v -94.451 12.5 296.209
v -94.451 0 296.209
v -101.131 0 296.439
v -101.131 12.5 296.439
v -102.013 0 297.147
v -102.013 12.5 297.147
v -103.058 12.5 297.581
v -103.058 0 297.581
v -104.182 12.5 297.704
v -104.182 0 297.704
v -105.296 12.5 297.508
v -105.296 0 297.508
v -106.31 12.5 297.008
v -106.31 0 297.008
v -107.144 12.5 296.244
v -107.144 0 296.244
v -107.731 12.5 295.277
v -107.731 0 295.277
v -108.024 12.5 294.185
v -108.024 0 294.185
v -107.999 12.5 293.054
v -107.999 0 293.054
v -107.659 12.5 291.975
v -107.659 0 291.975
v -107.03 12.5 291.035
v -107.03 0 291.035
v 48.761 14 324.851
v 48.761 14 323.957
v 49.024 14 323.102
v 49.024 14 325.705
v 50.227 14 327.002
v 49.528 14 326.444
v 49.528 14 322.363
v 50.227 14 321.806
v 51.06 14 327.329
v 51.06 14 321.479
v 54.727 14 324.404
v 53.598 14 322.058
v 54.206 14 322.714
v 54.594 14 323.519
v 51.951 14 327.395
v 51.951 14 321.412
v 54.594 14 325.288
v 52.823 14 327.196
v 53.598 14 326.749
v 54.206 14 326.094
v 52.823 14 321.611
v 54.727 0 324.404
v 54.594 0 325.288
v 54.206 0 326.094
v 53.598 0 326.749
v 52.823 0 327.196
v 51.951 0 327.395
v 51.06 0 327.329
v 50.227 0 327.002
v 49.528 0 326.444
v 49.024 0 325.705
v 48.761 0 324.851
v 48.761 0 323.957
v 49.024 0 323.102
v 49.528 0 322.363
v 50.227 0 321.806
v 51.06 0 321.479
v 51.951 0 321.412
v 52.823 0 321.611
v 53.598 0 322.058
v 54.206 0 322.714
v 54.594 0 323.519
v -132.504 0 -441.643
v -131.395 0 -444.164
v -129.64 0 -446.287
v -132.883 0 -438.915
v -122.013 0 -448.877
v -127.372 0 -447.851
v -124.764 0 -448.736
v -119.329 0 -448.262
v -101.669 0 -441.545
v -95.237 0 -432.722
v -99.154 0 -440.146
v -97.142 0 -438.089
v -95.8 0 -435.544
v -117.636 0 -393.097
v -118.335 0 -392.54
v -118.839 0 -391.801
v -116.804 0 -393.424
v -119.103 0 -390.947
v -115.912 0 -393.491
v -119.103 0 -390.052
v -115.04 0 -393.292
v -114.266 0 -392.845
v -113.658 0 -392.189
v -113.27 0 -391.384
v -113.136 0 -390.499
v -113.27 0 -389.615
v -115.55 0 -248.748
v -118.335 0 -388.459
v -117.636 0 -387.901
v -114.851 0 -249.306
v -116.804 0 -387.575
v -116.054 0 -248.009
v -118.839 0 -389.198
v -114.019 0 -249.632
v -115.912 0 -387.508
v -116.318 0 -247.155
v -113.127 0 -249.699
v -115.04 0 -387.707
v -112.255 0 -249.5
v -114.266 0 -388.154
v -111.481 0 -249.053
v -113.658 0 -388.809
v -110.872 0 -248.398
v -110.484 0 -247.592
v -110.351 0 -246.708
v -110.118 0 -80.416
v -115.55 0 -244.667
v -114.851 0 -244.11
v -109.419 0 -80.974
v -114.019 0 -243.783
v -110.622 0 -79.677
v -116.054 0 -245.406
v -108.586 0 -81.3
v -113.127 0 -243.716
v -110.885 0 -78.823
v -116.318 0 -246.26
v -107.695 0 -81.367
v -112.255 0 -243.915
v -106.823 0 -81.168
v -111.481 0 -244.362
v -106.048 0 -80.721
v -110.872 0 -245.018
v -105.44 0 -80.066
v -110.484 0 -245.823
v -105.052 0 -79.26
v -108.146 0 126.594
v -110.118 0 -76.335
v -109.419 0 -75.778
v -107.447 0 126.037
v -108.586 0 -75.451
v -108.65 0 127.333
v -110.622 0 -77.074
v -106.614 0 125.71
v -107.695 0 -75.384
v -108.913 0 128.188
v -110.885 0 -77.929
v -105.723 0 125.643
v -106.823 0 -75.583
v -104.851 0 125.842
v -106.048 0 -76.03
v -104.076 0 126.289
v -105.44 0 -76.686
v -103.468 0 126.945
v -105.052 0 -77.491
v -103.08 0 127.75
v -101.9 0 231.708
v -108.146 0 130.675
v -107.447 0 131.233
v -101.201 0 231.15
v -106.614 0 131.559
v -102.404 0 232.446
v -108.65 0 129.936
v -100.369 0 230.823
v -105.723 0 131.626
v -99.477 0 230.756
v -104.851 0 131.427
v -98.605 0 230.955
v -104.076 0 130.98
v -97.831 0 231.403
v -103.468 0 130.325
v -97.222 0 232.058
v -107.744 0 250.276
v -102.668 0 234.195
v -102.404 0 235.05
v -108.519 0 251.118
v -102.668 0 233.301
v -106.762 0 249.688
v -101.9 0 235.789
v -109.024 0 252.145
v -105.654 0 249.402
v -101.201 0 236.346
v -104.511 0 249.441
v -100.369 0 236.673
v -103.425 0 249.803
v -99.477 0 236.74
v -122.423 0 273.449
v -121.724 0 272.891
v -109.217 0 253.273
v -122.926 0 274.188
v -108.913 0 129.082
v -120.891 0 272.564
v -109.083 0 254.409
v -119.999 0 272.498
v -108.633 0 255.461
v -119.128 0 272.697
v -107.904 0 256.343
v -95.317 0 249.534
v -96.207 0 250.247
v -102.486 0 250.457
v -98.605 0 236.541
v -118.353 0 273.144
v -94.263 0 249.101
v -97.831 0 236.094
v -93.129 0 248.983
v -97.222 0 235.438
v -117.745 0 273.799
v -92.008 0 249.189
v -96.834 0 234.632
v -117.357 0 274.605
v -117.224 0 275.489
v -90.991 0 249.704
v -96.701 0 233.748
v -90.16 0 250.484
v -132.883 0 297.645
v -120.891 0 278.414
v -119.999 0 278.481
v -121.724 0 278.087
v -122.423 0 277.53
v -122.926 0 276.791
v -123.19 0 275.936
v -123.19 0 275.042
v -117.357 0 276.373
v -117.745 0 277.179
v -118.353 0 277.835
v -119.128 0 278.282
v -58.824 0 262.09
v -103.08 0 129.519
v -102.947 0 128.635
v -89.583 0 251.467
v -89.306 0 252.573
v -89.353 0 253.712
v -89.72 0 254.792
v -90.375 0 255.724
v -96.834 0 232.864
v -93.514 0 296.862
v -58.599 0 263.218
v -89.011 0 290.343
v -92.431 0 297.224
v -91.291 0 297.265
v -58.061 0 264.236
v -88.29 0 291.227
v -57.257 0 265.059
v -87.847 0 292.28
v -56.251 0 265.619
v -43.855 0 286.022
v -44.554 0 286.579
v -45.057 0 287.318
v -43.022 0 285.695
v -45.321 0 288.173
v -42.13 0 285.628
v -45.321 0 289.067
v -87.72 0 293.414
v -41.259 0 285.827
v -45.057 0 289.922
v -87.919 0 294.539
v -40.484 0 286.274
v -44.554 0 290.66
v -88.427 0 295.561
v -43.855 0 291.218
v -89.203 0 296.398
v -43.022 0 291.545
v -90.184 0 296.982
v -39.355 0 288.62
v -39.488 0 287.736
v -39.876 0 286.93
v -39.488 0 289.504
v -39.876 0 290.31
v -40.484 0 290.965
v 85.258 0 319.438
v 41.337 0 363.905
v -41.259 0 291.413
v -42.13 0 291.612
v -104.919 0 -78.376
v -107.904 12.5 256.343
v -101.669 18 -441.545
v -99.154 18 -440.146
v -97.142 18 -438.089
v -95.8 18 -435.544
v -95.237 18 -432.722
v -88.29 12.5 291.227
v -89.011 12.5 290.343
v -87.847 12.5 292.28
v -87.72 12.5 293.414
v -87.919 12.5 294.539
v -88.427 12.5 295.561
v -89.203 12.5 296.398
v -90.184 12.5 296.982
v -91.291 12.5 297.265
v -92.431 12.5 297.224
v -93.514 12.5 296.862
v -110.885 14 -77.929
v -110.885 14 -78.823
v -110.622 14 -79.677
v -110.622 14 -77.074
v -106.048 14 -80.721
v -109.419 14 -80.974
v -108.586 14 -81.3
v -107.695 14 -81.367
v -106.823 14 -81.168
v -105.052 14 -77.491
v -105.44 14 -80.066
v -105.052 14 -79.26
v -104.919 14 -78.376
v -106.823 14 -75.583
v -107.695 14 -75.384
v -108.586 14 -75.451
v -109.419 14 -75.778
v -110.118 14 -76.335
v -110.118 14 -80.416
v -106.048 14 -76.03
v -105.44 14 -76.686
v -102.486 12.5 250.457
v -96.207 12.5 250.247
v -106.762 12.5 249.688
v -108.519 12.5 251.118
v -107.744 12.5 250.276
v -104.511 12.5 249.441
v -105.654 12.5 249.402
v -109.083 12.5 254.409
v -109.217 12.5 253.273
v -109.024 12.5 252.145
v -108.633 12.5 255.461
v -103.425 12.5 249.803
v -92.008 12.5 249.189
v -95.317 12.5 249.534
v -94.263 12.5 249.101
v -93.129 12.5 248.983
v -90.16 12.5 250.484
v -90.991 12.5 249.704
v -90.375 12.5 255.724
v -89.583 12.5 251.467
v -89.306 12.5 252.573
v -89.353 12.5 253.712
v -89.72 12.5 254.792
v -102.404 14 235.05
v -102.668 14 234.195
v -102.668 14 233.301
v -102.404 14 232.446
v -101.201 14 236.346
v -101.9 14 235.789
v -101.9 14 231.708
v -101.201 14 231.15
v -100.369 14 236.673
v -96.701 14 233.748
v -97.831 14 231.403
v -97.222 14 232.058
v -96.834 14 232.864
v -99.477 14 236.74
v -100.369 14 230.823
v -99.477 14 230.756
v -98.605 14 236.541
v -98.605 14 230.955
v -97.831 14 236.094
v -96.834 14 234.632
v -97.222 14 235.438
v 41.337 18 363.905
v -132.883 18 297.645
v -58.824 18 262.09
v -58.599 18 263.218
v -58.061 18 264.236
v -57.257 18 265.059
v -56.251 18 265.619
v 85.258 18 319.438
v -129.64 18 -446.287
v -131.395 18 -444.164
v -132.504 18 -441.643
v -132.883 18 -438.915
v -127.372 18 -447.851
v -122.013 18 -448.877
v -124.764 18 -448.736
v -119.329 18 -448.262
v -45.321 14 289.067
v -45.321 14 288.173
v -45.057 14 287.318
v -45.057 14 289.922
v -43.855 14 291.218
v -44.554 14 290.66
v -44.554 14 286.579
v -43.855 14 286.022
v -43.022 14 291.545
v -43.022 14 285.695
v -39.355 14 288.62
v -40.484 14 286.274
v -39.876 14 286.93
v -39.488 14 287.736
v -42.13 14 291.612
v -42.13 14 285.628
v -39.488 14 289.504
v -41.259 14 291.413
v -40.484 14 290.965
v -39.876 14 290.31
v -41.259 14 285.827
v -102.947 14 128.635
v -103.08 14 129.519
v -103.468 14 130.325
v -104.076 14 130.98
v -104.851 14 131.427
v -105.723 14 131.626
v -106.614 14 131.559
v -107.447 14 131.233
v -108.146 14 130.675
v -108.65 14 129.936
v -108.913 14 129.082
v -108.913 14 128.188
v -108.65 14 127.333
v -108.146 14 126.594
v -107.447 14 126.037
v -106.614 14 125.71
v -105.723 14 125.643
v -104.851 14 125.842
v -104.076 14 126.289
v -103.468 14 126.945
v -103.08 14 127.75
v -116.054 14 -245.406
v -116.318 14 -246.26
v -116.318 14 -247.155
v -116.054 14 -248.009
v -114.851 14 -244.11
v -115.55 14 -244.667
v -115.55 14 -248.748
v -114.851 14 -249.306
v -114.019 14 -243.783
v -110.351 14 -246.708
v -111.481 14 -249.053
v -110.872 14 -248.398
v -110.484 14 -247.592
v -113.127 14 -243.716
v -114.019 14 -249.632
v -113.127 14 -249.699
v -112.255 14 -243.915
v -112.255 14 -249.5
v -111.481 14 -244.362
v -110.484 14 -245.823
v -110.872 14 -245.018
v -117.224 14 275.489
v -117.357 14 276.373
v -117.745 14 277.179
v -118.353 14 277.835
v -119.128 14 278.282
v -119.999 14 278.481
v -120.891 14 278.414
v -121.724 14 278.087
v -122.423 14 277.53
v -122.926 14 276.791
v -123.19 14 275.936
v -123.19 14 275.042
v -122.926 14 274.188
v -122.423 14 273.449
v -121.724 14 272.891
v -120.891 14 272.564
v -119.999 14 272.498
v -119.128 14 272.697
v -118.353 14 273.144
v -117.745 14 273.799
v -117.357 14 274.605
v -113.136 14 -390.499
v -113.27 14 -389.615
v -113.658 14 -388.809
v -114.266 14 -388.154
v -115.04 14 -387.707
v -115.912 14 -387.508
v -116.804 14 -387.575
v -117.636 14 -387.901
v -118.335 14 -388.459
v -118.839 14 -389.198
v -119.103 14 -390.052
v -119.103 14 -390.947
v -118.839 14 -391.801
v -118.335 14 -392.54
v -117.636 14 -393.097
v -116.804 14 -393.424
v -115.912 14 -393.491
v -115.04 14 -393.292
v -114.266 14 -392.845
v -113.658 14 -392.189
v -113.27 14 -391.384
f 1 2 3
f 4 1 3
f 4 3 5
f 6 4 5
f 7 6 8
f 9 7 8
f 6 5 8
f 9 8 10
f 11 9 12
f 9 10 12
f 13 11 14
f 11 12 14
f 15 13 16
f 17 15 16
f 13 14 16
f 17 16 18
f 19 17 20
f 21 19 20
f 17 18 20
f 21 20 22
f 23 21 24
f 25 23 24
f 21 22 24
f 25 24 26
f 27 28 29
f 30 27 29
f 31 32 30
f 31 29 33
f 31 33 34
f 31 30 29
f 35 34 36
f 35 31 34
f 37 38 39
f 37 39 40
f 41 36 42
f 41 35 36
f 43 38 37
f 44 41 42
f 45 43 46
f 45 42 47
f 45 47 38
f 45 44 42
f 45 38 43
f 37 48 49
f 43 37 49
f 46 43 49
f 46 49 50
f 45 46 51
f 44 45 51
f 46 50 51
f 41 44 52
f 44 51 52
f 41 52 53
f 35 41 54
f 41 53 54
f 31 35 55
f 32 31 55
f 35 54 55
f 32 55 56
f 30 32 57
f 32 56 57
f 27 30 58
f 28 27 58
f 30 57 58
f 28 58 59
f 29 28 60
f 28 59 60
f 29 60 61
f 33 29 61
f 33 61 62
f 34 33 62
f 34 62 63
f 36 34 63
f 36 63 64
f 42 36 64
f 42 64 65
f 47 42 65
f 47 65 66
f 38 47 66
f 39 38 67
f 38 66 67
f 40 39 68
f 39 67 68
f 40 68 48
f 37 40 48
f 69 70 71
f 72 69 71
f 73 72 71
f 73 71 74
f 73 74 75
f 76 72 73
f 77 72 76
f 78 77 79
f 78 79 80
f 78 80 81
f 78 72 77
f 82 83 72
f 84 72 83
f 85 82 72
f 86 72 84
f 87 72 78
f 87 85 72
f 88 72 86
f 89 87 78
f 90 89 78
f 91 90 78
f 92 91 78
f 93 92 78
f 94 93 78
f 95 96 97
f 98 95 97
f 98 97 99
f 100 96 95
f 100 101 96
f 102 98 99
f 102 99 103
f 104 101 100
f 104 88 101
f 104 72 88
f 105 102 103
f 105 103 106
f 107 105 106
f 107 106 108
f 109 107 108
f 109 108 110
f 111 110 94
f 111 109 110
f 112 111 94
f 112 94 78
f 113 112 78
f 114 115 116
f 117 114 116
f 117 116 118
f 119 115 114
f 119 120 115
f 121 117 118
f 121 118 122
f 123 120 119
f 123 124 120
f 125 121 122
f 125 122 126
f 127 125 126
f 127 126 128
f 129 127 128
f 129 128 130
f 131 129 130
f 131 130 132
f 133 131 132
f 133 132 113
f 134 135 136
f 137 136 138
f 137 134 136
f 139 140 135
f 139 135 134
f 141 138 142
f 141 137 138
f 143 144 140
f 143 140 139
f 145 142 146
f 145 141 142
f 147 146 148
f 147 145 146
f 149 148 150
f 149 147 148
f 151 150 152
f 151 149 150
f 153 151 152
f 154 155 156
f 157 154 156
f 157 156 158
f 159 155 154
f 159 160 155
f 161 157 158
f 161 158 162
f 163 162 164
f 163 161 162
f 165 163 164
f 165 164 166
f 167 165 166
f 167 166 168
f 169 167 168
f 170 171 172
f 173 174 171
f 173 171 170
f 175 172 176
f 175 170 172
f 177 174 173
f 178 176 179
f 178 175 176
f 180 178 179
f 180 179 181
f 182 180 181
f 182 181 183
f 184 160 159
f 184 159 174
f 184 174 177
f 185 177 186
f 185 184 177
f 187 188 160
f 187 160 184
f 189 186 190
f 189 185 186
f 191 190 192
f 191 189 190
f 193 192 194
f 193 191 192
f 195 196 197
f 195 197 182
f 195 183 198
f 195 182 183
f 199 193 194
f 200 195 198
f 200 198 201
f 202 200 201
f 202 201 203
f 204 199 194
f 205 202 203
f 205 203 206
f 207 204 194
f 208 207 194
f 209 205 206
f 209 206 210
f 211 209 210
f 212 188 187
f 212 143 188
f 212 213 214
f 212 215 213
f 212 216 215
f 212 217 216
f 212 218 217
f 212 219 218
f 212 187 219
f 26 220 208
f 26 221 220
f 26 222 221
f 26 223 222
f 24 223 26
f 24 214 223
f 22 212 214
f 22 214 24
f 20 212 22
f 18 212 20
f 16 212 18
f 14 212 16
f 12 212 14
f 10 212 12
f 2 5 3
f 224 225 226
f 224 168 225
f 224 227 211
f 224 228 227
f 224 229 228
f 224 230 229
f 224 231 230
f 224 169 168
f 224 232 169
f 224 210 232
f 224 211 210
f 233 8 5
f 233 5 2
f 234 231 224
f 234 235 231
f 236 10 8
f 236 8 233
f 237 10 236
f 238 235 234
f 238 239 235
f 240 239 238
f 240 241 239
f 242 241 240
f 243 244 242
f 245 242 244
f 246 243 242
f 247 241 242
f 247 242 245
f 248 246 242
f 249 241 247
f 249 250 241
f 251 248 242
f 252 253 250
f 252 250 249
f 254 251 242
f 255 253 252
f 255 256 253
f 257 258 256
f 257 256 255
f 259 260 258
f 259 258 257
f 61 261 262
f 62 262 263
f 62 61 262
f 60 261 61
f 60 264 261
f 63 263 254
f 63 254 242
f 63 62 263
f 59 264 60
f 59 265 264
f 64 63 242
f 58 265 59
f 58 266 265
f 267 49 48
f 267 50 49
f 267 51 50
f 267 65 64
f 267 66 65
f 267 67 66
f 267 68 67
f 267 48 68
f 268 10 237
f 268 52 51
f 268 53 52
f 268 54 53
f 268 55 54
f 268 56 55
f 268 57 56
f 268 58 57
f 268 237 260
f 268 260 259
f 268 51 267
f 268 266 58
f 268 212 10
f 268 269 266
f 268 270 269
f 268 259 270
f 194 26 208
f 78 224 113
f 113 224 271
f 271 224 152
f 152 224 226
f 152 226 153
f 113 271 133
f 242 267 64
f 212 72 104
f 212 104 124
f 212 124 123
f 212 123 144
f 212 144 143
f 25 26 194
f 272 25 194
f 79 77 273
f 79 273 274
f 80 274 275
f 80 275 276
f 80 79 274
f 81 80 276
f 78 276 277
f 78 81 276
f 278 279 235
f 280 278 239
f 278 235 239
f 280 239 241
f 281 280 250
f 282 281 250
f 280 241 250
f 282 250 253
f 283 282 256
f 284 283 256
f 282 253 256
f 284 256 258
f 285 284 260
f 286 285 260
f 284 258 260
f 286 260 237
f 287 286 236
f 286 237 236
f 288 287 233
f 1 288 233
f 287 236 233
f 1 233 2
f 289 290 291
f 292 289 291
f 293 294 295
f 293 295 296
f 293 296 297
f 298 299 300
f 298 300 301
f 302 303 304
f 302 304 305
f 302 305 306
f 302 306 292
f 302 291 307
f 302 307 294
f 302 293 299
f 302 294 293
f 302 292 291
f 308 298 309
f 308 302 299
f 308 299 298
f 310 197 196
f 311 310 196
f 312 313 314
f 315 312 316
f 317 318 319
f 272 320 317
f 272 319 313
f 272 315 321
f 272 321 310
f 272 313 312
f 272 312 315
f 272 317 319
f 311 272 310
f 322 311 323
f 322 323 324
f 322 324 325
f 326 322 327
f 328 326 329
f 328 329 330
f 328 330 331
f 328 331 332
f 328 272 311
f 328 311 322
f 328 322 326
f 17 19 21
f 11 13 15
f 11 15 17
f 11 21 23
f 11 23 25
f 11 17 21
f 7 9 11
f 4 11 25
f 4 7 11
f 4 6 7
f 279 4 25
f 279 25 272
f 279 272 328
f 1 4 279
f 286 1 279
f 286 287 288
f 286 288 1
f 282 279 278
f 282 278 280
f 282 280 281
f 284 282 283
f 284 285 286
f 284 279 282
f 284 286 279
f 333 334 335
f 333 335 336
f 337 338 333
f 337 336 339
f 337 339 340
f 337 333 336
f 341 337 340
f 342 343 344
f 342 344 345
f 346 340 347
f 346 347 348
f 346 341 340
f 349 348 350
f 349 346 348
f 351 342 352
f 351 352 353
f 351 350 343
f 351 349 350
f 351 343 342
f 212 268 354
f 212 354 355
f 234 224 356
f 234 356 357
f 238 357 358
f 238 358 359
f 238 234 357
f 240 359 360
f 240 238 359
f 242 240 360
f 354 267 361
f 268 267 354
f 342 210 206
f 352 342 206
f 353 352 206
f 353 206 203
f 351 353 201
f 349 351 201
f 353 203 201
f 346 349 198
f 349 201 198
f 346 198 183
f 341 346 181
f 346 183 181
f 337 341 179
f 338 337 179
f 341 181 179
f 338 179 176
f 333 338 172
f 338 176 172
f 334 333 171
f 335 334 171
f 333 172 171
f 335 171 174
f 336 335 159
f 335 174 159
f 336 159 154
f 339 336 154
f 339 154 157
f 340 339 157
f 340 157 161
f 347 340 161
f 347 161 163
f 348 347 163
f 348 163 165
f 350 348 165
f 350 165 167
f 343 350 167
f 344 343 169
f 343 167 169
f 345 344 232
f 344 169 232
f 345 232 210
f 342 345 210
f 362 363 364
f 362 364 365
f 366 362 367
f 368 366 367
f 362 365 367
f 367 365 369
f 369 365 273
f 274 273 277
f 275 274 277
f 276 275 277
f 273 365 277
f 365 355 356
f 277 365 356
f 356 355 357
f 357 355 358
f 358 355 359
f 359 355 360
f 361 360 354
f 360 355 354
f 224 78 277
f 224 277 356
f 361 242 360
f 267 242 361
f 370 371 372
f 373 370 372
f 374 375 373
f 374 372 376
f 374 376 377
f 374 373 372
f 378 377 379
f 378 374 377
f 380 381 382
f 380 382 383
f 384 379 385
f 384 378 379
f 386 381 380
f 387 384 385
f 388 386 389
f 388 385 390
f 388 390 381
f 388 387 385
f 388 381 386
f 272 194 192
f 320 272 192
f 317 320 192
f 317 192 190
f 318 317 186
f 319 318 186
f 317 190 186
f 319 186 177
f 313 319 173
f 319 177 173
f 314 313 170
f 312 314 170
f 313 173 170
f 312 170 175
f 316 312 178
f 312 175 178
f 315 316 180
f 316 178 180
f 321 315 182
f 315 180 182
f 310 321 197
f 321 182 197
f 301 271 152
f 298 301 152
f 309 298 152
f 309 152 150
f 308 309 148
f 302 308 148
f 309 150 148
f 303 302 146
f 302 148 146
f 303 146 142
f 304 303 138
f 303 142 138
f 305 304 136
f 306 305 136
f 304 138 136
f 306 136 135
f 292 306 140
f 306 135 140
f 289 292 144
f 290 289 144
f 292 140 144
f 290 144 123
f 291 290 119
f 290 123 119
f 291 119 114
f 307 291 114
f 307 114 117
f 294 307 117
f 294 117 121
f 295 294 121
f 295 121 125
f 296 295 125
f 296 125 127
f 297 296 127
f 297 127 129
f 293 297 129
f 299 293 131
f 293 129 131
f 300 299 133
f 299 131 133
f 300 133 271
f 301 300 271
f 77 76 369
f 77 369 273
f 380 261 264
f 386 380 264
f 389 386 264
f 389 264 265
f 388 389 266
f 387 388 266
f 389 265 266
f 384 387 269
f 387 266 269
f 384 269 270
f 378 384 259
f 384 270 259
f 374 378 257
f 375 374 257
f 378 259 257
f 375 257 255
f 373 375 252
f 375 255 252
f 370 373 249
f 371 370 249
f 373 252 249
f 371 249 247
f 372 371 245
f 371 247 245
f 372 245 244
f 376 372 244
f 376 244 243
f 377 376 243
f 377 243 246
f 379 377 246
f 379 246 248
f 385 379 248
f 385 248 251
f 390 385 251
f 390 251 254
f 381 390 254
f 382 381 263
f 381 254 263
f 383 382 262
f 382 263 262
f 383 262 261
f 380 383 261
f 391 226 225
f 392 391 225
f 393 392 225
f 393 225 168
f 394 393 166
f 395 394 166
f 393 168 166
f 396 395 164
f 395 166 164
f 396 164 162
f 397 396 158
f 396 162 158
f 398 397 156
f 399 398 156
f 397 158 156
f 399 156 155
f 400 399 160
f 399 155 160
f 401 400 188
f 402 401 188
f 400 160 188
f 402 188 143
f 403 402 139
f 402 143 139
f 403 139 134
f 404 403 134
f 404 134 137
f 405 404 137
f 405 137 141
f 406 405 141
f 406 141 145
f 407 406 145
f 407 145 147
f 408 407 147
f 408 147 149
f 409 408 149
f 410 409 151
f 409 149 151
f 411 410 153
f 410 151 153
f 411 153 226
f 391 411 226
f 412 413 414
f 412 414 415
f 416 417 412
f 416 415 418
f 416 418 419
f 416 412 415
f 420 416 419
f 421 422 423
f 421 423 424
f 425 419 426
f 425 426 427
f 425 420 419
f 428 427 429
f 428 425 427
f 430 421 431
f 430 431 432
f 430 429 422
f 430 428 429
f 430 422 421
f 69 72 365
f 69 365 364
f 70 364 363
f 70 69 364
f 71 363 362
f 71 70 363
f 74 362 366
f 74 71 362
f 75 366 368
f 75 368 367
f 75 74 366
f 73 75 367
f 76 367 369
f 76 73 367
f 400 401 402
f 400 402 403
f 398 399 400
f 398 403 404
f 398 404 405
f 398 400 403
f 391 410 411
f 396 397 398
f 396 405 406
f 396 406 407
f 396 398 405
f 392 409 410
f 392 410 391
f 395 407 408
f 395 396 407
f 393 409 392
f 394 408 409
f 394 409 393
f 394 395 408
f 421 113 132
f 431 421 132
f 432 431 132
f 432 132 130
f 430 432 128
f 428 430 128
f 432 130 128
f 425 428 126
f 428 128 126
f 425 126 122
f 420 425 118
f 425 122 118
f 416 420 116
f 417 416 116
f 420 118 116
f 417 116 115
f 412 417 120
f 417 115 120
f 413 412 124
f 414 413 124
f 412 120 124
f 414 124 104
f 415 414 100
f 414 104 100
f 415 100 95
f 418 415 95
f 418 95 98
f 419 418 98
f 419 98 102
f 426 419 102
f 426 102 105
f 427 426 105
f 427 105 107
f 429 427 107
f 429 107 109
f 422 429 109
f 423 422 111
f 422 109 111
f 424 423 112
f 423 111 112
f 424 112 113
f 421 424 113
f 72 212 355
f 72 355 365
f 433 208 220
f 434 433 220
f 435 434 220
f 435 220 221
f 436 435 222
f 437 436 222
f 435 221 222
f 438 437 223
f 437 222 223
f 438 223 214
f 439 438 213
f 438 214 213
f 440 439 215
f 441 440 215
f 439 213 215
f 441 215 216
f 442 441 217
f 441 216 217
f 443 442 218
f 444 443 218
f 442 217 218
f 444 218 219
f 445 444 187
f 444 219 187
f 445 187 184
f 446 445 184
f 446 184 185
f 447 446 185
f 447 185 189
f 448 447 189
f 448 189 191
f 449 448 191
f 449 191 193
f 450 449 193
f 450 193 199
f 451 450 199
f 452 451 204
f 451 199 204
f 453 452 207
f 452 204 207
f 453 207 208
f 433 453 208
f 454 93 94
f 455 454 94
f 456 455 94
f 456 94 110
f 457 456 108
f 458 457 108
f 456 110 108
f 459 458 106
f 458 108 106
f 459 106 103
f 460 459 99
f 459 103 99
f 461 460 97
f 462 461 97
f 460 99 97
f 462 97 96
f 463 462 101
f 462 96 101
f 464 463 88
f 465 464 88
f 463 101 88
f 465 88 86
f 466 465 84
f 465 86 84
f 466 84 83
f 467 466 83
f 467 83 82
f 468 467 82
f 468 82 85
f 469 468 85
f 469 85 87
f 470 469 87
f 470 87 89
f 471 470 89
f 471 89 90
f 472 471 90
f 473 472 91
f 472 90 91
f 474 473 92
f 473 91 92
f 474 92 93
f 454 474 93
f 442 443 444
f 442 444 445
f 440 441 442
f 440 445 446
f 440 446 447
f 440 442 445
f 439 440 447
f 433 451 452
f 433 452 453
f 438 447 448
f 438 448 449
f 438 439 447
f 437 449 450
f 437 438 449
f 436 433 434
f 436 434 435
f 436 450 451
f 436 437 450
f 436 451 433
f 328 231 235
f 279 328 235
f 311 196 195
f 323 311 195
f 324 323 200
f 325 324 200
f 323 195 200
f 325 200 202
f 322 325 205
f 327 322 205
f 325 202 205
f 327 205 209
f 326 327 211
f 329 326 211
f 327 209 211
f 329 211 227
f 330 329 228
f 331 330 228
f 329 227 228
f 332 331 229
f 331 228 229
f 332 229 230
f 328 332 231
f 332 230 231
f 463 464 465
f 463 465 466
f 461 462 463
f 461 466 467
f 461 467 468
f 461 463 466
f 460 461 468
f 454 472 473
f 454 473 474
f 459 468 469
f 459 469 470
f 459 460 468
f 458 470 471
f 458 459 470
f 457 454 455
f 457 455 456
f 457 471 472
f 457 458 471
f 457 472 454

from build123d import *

# Parameters (mm, degrees)
F0_R     = 3
F1_DEPTH = 18
F2_DEPTH = 14
F3_DEPTH = 12.5


# Not quite as in the source:
# - ends of sketch curves that miss each other by under 0.0002 mm in the source are joined


with BuildPart() as f1:
    # F0 (on Front) → F1 (new body)
    with BuildSketch(Plane.XZ):
        with BuildLine():
            Line((-119.3285324557, -448.2617723394), (-101.6685144557, -441.5452453394))
            ThreePointArc((-101.6685144557, -441.5452453394), (-97.1422559669, -438.0887567531), (-95.2370421293, -432.7217753041))
            Line((-95.2370421293, -432.7217753041), (-58.8235234557, 262.0895416606))
            ThreePointArc((-58.8235234557, 262.0895416606), (-58.06143799, 264.2363343101), (-56.250934498, 265.6189297718))
            Line((-56.250934498, 265.6189297718), (85.2578445443, 319.4380986606))
            Line((85.2578445443, 319.4380986606), (41.3370915443, 363.9049416606))
            Line((41.3370915443, 363.9049416606), (-132.8833544557, 297.6447436606))
            Line((-132.8833544557, 297.6447436606), (-132.8833544557, -438.9149423394))
            ThreePointArc((-132.8833544557, -438.9149423394), (-128.5601395631, -447.1474456551), (-119.3285324557, -448.2617723394))
        make_face()
        with Locations((-116.1363294557, -390.4994083394)):
            Circle(F0_R, mode=Mode.SUBTRACT)
        with Locations((-113.3511164557, -246.7075803394)):
            Circle(F0_R, mode=Mode.SUBTRACT)
        with Locations((-107.9187374557, -78.3756793394)):
            Circle(F0_R, mode=Mode.SUBTRACT)
        with Locations((-105.9467734557, 128.6347116606)):
            Circle(F0_R, mode=Mode.SUBTRACT)
        with Locations((-99.7011464557, 233.7480486606)):
            Circle(F0_R, mode=Mode.SUBTRACT)
        with Locations((-120.2235504557, 275.4892296606)):
            Circle(F0_R, mode=Mode.SUBTRACT)
        with BuildLine():
            ThreePointArc((-90.3754553764, 255.7239337355), (-90.5472879726, 250.0640248228), (-96.2068413545, 250.2471937553))
            Line((-96.2068413545, 250.2471937553), (-102.4861304557, 250.4567146606))
            ThreePointArc((-102.4861304557, 250.4567146606), (-108.1617141765, 250.6689360163), (-107.9038666822, 256.3426299107))
            Line((-107.9038666822, 256.3426299107), (-107.0299454557, 291.0352376606))
            ThreePointArc((-107.0299454557, 291.0352376606), (-106.7545815371, 296.6558621202), (-101.1313975225, 296.4389595982))
            Line((-101.1313975225, 296.4389595982), (-94.4508164557, 296.2088706606))
            ThreePointArc((-94.4508164557, 296.2088706606), (-88.7851572097, 296.0073908544), (-89.0114747479, 290.3426689785))
            Line((-89.0114747479, 290.3426689785), (-90.3754553764, 255.7239337355))
        make_face(mode=Mode.SUBTRACT)
        with Locations((-42.3545774557, 288.6199666606)):
            Circle(F0_R, mode=Mode.SUBTRACT)
        with Locations((51.7271015443, 324.4037386606)):
            Circle(F0_R, mode=Mode.SUBTRACT)
        with Locations((-116.1363294557, -390.4994083394)):
            Circle(F0_R)
        with Locations((-113.3511164557, -246.7075803394)):
            Circle(F0_R)
        with Locations((-107.9187374557, -78.3756793394)):
            Circle(F0_R)
        with Locations((-105.9467734557, 128.6347116606)):
            Circle(F0_R)
        with Locations((-120.2235504557, 275.4892296606)):
            Circle(F0_R)
        with Locations((-99.7011464557, 233.7480486606)):
            Circle(F0_R)
        with Locations((-42.3545774557, 288.6199666606)):
            Circle(F0_R)
        with Locations((51.7271015443, 324.4037386606)):
            Circle(F0_R)
        with BuildLine():
            Line((-102.4861304557, 250.4567146606), (-96.2068414557, 250.2471936606))
            ThreePointArc((-96.2068414557, 250.2471936606), (-90.5472879726, 250.0640248228), (-90.3754553764, 255.7239337355))
            Line((-90.3754553764, 255.7239337355), (-89.0114744557, 290.3426686606))
            ThreePointArc((-89.0114744557, 290.3426686606), (-88.7851572097, 296.0073908544), (-94.4508168599, 296.2088710928))
            Line((-94.4508168599, 296.2088710928), (-101.1313974557, 296.4389596606))
            ThreePointArc((-101.1313974557, 296.4389596606), (-106.7545815371, 296.6558621202), (-107.0299455087, 291.0352376131))
            Line((-107.0299455087, 291.0352376131), (-107.9038664557, 256.3426296606))
            ThreePointArc((-107.9038664557, 256.3426296606), (-108.1617141765, 250.6689360163), (-102.4861304557, 250.4567146606))
        make_face()
    extrude(amount=-F1_DEPTH)

    # F0 (on Front) → F2 (cut)
    with BuildSketch(Plane.XZ):
        with Locations((-116.1363294557, -390.4994083394)):
            Circle(F0_R)
        with Locations((-113.3511164557, -246.7075803394)):
            Circle(F0_R)
        with Locations((-107.9187374557, -78.3756793394)):
            Circle(F0_R)
        with Locations((-105.9467734557, 128.6347116606)):
            Circle(F0_R)
        with Locations((-120.2235504557, 275.4892296606)):
            Circle(F0_R)
        with Locations((-99.7011464557, 233.7480486606)):
            Circle(F0_R)
        with Locations((-42.3545774557, 288.6199666606)):
            Circle(F0_R)
        with Locations((51.7271015443, 324.4037386606)):
            Circle(F0_R)
    extrude(amount=-F2_DEPTH, mode=Mode.SUBTRACT)

    # F0 (on Front) → F3 (cut)
    with BuildSketch(Plane.XZ):
        with BuildLine():
            Line((-102.4861304557, 250.4567146606), (-96.2068414557, 250.2471936606))
            ThreePointArc((-96.2068414557, 250.2471936606), (-90.5472879726, 250.0640248228), (-90.3754553764, 255.7239337355))
            Line((-90.3754553764, 255.7239337355), (-89.0114744557, 290.3426686606))
            ThreePointArc((-89.0114744557, 290.3426686606), (-88.7851572097, 296.0073908544), (-94.4508168599, 296.2088710928))
            Line((-94.4508168599, 296.2088710928), (-101.1313974557, 296.4389596606))
            ThreePointArc((-101.1313974557, 296.4389596606), (-106.7545815371, 296.6558621202), (-107.0299455087, 291.0352376131))
            Line((-107.0299455087, 291.0352376131), (-107.9038664557, 256.3426296606))
            ThreePointArc((-107.9038664557, 256.3426296606), (-108.1617141765, 250.6689360163), (-102.4861304557, 250.4567146606))
        make_face()
    extrude(amount=-F3_DEPTH, mode=Mode.SUBTRACT)


solid = f1.part
